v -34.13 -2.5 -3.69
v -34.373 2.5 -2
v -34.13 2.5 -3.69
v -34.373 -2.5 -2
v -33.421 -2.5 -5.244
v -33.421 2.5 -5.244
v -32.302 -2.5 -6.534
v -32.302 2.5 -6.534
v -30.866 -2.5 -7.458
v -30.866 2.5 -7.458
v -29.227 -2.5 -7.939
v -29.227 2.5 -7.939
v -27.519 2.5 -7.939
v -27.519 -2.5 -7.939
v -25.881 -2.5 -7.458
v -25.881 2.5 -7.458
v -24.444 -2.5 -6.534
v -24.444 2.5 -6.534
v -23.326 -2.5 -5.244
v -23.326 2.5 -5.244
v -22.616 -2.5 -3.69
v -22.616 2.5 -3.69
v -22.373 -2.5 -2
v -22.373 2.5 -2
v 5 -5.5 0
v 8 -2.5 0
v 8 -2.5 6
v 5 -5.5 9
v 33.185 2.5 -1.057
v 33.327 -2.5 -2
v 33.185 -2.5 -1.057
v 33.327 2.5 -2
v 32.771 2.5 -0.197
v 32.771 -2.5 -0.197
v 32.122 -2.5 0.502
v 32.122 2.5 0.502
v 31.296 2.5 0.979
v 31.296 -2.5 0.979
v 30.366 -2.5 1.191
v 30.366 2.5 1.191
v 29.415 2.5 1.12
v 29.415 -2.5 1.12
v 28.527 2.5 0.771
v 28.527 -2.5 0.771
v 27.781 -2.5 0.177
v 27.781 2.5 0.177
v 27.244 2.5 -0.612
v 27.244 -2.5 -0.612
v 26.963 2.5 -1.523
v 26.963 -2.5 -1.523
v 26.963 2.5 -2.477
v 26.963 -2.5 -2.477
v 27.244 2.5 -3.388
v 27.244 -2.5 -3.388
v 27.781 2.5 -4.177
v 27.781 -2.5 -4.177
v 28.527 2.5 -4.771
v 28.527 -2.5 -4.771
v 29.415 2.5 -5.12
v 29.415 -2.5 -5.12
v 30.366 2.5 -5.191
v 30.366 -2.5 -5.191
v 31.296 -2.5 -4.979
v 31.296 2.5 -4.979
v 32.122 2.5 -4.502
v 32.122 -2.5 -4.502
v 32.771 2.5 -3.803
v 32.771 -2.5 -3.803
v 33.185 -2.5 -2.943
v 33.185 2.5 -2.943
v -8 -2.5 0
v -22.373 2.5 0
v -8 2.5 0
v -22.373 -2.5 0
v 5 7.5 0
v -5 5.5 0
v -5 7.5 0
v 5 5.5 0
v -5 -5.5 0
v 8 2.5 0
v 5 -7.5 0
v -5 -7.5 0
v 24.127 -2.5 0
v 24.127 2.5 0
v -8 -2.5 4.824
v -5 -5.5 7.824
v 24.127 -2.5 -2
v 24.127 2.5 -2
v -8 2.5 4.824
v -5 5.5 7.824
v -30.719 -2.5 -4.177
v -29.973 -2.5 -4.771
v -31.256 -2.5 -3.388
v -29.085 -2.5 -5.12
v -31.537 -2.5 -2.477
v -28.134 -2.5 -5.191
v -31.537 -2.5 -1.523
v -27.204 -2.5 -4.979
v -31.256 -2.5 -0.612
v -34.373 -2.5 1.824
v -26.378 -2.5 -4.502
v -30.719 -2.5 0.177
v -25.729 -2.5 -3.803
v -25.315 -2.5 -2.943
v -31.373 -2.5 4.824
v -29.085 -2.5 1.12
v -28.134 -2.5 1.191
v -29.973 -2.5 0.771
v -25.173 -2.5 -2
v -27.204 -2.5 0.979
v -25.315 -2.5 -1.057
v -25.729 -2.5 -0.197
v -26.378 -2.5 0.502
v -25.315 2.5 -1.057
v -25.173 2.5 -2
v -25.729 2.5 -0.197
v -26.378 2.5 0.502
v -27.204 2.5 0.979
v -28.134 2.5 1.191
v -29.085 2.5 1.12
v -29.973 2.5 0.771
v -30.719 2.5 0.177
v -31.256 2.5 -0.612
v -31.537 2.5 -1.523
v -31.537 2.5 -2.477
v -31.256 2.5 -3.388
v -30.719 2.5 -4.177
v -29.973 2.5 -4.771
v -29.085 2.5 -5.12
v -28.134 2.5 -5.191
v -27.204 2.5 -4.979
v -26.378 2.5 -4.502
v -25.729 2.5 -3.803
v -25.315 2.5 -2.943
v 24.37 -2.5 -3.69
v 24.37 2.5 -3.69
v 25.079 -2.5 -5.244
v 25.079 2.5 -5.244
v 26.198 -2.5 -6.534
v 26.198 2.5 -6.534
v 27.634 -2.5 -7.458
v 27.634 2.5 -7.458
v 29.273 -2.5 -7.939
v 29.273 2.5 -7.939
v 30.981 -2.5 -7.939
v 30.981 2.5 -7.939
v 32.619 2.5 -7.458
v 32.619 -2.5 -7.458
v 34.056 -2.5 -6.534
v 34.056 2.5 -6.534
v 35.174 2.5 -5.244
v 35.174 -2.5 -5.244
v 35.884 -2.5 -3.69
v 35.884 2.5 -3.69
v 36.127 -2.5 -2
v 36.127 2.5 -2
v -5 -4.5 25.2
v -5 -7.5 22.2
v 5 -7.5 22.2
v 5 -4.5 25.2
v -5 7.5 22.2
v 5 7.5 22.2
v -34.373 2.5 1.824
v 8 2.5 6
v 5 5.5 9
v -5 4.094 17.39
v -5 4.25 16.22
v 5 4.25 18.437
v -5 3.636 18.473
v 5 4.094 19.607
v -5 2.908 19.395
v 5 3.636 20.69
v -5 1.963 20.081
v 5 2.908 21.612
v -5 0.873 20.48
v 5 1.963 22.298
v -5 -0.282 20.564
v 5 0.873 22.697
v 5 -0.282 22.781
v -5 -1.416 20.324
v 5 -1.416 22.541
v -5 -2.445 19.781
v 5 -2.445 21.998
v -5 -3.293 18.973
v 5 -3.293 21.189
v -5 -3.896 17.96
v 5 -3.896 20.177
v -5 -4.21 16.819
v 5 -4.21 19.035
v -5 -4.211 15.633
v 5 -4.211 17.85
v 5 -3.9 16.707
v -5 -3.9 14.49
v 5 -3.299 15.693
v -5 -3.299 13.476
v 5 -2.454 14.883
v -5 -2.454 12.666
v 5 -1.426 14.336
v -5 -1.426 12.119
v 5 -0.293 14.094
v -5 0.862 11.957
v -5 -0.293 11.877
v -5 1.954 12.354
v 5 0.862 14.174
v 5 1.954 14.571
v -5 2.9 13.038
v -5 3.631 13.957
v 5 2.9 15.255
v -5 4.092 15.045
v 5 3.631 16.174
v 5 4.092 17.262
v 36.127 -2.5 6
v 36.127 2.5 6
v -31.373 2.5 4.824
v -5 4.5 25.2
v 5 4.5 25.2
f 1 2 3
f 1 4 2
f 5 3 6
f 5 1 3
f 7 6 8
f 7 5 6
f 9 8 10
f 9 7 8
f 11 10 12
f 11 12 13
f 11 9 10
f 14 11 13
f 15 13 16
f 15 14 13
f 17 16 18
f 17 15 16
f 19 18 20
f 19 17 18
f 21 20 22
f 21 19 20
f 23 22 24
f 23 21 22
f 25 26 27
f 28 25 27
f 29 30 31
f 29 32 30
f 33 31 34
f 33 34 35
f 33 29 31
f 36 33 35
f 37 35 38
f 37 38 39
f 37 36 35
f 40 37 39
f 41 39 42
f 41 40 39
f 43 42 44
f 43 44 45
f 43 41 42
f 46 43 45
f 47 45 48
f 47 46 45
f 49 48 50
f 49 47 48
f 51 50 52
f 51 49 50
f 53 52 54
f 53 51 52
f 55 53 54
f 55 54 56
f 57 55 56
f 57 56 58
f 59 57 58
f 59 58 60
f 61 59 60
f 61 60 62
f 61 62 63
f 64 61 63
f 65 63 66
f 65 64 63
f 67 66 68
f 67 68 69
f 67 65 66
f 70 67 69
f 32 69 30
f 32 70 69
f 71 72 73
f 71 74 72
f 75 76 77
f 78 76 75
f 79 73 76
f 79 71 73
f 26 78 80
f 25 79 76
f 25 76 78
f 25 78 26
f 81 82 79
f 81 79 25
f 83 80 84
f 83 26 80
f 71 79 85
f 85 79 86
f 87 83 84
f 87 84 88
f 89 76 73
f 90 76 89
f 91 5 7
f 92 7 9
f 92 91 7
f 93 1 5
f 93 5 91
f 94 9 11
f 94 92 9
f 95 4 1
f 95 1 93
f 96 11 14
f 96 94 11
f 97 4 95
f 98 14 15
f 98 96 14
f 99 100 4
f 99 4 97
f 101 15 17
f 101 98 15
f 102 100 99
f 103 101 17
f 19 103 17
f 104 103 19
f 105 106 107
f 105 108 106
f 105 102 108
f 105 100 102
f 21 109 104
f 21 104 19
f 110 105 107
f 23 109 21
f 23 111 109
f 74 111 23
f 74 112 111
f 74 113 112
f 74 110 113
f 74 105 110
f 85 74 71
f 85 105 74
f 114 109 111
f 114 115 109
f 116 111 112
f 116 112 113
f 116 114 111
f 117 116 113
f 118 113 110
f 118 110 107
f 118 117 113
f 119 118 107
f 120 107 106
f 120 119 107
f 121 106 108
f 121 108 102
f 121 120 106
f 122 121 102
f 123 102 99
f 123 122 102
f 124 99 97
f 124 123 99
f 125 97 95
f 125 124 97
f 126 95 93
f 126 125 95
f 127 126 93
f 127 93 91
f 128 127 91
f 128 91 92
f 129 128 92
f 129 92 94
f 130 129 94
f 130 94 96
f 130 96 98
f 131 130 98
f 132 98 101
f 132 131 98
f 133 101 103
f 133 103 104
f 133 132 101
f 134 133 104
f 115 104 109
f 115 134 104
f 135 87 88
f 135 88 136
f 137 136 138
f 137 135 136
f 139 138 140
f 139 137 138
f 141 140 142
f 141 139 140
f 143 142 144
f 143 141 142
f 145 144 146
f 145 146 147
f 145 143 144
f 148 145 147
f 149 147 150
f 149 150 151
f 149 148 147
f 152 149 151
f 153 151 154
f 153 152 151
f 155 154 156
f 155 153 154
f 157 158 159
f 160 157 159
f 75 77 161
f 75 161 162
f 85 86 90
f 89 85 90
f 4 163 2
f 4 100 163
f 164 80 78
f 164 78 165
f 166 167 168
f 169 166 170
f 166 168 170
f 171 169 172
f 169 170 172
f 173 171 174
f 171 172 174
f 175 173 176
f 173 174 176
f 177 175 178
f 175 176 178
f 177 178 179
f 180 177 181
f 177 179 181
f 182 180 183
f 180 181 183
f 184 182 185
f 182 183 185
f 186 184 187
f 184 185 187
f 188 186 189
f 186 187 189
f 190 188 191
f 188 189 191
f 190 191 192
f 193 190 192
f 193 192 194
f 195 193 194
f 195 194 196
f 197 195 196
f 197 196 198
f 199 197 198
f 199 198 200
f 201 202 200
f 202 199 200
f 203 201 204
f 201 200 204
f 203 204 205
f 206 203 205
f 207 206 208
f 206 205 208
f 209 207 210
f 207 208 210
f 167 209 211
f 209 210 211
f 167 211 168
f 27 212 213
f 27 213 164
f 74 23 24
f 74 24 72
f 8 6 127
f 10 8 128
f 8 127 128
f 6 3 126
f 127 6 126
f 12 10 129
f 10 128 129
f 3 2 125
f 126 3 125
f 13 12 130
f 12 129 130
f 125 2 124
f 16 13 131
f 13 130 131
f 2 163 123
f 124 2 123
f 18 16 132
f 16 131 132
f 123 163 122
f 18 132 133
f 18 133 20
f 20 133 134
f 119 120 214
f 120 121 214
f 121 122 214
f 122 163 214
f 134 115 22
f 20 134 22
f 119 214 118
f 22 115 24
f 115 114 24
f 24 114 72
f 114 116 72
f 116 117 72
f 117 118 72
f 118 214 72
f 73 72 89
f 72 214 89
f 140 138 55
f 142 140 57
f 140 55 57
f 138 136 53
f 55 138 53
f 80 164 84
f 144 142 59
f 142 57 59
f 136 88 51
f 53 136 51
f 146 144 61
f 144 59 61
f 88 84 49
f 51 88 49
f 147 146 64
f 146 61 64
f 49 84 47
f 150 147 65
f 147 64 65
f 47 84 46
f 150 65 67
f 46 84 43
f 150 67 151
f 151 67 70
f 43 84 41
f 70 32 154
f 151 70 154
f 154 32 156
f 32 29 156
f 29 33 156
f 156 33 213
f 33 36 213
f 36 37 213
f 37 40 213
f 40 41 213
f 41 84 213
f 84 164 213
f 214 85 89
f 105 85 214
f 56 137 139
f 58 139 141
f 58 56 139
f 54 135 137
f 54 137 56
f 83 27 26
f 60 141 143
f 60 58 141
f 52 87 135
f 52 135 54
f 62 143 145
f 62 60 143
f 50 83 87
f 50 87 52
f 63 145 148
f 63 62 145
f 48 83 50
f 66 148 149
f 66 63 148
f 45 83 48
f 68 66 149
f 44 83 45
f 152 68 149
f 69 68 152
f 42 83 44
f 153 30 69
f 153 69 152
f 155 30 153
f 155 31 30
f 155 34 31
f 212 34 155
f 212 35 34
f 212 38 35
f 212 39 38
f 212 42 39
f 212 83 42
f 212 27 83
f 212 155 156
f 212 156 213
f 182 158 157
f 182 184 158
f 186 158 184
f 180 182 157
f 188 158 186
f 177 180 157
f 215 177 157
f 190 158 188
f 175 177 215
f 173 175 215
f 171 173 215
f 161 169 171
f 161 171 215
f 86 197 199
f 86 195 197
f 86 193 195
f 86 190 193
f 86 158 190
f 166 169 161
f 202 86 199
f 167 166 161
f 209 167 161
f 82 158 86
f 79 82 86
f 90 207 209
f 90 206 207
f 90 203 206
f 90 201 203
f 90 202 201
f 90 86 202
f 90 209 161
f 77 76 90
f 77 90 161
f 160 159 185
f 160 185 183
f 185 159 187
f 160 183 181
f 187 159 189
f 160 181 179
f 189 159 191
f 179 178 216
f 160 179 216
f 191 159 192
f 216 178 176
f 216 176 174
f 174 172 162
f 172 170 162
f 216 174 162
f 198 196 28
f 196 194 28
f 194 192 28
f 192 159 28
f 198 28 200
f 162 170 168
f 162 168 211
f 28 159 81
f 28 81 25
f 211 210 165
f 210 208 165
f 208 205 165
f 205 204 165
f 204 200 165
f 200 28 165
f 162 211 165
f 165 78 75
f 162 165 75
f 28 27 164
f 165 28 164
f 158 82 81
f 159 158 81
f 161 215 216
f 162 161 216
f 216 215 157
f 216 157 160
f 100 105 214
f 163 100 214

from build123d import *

# Parameters (mm, degrees)
F0_W     = 10
F0_H     = 15
F1_DEPTH = 25.2
F4_R     = 4.25
F5_DEPTH = 25
F6_R     = 3.2
F7_DEPTH = 2.5
F8_SIZE  = 3


with BuildPart() as f1:
    # F0 (on Top) → F1 (new body)
    with BuildSketch(Plane.XY):
        Rectangle(F0_W, F0_H)
    extrude(amount=F1_DEPTH)

    # F4 (on line) → F5 (cut)
    with BuildSketch(Plane(origin=(10.0907595655, 0, 2.2370675377), x_dir=(0, 1, 0), z_dir=(0.9762960071, 0, 0.2164396139))):
        with Locations((0, 16.9178019303)):
            Circle(F4_R)
    extrude(amount=-F5_DEPTH, mode=Mode.SUBTRACT)

    # F6 (on Front) → F7 (join, symmetric)
    with BuildSketch(Plane.XZ):
        with BuildLine():
            ThreePointArc((-34.3731079698, -2), (-28.3731079698, -8), (-22.3731079698, -2))
            ThreePointArc((-22.3731079698, -2), (-28.3731079698, 4), (-34.3731079698, -2))
        make_face()
        with Locations((-28.3731079698, -2)):
            Circle(F6_R, mode=Mode.SUBTRACT)
        with BuildLine():
            ThreePointArc((-34.3731079698, -2), (-28.3731079698, 4), (-22.3731079698, -2))
            Line((-22.3731079698, -2), (-22.3731079698, 0))
            Line((-22.3731079698, 0), (24.1268920302, 0))
            Line((24.1268920302, 0), (24.1268920302, -2))
            ThreePointArc((24.1268920302, -2), (30.1268920302, 4), (36.1268920302, -2))
            Line((36.1268920302, -2), (36.1268920302, 3.4847958965))
            Line((36.1268920302, 3.4847958965), (36.1268920302, 6))
            Line((36.1268920302, 6), (4.5456811786, 6))
            Line((4.5456811786, 6), (4.3161994133, 4.8236340731))
            Line((4.3161994133, 4.8236340731), (-34.3731079698, 4.8236340731))
            Line((-34.3731079698, 4.8236340731), (-34.3731079698, 3.4847958965))
            Line((-34.3731079698, 3.4847958965), (-34.3731079698, -2))
        make_face()
        with BuildLine():
            ThreePointArc((36.1268920302, -2), (30.1268920302, 4), (24.1268920302, -2))
            ThreePointArc((24.1268920302, -2), (30.1268920302, -8), (36.1268920302, -2))
        make_face()
        with Locations((30.1268920302, -2)):
            Circle(F6_R, mode=Mode.SUBTRACT)
    extrude(amount=F7_DEPTH, both=True)

    # F8
    f8_edges = [f1.edges().sort_by_distance(p)[0] for p in [
        (-5, 0, 4.823634),
        (5, 0, 6),
        (0, -7.5, 25.2),
        (0, 7.5, 25.2),
        (5, -2.5, 3),
        (5, 2.5, 3),
        (-5, 2.5, 2.411817),
        (-5, -2.5, 2.411817),
        (-34.373108, 0, 4.823634),
    ]]
    chamfer(f8_edges, length=F8_SIZE)


solid = f1.part
